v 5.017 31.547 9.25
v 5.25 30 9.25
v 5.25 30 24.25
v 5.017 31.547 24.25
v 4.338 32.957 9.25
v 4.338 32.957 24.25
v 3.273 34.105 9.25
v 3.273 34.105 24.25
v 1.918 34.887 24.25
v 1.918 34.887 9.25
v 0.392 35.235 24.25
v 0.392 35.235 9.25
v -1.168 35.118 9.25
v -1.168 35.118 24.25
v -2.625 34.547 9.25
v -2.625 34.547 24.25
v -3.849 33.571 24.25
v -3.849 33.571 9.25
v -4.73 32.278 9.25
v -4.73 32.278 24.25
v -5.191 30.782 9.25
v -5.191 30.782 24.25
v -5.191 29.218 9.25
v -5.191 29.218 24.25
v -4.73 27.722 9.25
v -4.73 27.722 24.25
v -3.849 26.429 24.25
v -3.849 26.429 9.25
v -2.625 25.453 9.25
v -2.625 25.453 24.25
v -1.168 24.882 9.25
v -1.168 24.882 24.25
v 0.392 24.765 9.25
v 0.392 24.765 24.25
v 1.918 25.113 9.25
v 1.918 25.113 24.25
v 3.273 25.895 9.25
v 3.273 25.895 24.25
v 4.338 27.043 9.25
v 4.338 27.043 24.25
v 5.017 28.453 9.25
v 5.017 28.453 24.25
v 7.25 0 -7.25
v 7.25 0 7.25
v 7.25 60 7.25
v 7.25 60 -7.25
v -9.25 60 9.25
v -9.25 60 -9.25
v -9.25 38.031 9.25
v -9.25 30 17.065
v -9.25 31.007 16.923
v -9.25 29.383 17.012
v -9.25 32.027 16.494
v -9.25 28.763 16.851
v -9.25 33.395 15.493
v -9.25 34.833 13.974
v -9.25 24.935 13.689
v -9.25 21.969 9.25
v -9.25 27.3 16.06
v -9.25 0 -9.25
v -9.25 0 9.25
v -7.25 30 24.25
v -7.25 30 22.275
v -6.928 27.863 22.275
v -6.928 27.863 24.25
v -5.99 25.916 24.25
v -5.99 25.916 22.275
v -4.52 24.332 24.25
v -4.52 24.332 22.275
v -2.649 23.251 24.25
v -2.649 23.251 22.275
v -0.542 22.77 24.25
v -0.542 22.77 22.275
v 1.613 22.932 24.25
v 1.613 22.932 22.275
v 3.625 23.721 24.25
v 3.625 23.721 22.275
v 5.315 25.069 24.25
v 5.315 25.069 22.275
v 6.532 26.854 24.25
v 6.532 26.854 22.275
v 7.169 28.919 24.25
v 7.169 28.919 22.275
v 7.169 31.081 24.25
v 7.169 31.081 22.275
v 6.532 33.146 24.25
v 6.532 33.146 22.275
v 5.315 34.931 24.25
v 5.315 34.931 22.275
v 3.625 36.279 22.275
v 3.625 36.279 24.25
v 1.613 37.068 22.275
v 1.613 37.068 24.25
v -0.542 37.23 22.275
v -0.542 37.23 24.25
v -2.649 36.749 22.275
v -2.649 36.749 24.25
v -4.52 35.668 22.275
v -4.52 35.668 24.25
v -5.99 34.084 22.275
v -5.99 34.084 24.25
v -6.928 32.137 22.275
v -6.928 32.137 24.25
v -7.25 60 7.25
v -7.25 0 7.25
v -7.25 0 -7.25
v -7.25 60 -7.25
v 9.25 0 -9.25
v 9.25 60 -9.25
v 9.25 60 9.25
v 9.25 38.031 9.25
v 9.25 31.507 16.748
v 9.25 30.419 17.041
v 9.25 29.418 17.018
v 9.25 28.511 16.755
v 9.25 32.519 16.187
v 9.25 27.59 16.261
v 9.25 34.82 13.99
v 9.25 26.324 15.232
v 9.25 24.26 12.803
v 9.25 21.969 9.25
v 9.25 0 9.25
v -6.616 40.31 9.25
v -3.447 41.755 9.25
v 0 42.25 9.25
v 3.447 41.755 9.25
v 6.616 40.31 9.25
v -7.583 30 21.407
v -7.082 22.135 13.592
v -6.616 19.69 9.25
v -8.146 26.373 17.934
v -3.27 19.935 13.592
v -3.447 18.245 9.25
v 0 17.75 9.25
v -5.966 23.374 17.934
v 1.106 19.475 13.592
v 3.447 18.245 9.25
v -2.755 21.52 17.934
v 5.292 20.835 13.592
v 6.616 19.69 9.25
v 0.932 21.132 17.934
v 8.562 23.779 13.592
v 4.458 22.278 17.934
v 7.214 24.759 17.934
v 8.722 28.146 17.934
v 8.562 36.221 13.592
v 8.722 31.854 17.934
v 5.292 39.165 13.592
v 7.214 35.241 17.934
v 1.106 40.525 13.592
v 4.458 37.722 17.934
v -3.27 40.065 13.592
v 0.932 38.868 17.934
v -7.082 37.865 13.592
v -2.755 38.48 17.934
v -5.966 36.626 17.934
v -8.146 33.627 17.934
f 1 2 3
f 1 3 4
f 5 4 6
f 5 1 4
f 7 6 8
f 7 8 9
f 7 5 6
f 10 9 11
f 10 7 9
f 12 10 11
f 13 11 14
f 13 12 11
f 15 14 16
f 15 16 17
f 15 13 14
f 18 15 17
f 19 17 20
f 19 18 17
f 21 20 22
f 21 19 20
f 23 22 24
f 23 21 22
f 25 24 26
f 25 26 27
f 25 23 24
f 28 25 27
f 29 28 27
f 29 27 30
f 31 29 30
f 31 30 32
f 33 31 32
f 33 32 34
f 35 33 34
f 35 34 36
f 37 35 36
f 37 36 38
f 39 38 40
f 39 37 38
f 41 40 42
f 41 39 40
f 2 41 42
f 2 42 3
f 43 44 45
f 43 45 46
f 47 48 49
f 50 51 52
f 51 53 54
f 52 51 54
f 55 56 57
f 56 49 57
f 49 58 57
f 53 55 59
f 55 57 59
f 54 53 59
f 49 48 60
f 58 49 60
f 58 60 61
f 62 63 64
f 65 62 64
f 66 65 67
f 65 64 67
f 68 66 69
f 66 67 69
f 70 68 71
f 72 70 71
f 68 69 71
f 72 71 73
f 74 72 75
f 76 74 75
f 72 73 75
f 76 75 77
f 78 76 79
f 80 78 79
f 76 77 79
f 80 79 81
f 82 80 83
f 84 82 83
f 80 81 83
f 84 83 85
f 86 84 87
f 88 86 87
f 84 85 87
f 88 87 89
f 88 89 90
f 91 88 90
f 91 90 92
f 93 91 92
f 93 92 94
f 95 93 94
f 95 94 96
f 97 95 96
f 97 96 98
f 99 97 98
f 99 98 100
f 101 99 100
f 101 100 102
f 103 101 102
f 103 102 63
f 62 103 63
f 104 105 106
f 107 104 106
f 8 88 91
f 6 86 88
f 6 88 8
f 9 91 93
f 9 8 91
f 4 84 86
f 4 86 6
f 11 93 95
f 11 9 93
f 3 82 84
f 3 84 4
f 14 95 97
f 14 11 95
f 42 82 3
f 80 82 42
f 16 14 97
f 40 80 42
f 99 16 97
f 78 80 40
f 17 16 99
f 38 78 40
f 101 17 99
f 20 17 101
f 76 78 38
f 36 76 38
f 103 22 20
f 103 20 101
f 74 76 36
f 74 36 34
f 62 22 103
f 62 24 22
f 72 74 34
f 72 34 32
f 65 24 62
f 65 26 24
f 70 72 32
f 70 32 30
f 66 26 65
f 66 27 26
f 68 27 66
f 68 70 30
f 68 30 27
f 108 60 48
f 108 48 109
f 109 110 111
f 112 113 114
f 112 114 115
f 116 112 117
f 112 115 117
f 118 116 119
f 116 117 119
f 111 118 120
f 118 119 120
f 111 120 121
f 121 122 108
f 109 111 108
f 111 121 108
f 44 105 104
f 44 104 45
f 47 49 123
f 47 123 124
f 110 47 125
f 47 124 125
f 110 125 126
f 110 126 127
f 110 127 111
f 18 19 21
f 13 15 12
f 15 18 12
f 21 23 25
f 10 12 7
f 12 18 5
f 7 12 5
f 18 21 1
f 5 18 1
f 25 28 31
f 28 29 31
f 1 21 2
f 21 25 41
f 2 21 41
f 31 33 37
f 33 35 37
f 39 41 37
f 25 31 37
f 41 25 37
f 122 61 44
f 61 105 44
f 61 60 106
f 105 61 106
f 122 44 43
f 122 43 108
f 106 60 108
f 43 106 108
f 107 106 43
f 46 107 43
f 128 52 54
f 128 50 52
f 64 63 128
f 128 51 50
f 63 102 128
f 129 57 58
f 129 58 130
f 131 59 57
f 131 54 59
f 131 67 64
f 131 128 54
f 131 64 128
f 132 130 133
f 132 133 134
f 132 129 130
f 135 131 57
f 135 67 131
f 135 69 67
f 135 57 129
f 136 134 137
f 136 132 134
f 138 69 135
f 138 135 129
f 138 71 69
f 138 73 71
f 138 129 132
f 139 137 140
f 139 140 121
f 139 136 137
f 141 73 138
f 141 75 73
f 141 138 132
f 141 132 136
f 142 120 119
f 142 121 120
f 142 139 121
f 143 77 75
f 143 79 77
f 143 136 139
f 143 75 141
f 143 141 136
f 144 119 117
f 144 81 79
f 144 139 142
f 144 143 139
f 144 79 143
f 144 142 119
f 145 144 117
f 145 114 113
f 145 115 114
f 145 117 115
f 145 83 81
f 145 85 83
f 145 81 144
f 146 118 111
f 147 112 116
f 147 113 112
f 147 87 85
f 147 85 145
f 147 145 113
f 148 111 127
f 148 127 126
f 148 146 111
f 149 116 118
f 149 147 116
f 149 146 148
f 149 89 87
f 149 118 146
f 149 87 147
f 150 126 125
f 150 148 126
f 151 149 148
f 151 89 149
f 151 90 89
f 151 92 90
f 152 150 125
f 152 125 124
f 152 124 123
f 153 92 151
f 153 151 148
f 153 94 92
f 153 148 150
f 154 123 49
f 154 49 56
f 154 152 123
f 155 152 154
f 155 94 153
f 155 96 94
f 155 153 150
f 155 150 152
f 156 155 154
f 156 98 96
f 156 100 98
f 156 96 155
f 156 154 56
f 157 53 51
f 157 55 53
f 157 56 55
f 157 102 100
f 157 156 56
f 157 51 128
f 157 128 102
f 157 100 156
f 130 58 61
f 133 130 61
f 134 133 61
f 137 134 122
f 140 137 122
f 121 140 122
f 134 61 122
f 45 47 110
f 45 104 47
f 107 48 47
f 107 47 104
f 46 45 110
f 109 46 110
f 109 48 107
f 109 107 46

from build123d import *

# Parameters (mm, degrees)
SKETCH1_W           = 18.5
SKETCH1_H           = 18.5
SKETCH1_W_2         = 14.5
SKETCH1_H_2         = 14.5
BOSS_EXTRUDE1_DEPTH = 60
SKETCH2_R           = 7.25
SKETCH2_R_2         = 5.25
BOSS_EXTRUDE2_DEPTH = 15
CHAMFER1_SIZE       = 5
CHAMFER1_SIZE_2     = 13.025445323


with BuildPart() as part:
    # Sketch1 → Boss-Extrude1 (new body)
    with BuildSketch(Plane(origin=(0, 0, 0), x_dir=(1, 0, 0), z_dir=(0, 1, 0))):
        Rectangle(SKETCH1_W, SKETCH1_H)
        Rectangle(SKETCH1_W_2, SKETCH1_H_2, mode=Mode.SUBTRACT)
    extrude(amount=BOSS_EXTRUDE1_DEPTH)

    # Sketch2 → Boss-Extrude2 (add)
    with BuildSketch(Plane.XY.offset(9.25)):
        with Locations(Location((0, 30, 0), (0, 0, 180))):
            Circle(SKETCH2_R)
        with Locations((0, 30)):
            Circle(SKETCH2_R_2, mode=Mode.SUBTRACT)
    extrude(amount=BOSS_EXTRUDE2_DEPTH)

    # Chamfer1
    # the kernel refuses this chamfer: 13.025445323, 5 mm, written as the material it adds along each edge
    with BuildSketch(Plane(origin=(0, 30, 9.25), x_dir=(-1, 0, 0), z_dir=(0, 1, 0))) as chamfer1_piece_1_section:
        Polygon((7.25 + CHAMFER1_SIZE, 0), (7.25, CHAMFER1_SIZE_2), (7.25, 0), align=None)
    chamfer1_piece_1 = revolve(axis=Axis((0, 30, 9.25), (0, 0, 1)), mode=Mode.PRIVATE)
    chamfer1_piece_1 = split(chamfer1_piece_1, bisect_by=Plane(origin=(-9.25, 20.104834993, 11.052414917), z_dir=(1, 0, 0)), keep=Keep.TOP, mode=Mode.PRIVATE)
    chamfer1_piece_1 = split(chamfer1_piece_1, bisect_by=Plane(origin=(9.25, 20.104834993, 11.052414917), z_dir=(-1, 0, 0)), keep=Keep.TOP, mode=Mode.PRIVATE)
    add(chamfer1_piece_1)


solid = part.part
